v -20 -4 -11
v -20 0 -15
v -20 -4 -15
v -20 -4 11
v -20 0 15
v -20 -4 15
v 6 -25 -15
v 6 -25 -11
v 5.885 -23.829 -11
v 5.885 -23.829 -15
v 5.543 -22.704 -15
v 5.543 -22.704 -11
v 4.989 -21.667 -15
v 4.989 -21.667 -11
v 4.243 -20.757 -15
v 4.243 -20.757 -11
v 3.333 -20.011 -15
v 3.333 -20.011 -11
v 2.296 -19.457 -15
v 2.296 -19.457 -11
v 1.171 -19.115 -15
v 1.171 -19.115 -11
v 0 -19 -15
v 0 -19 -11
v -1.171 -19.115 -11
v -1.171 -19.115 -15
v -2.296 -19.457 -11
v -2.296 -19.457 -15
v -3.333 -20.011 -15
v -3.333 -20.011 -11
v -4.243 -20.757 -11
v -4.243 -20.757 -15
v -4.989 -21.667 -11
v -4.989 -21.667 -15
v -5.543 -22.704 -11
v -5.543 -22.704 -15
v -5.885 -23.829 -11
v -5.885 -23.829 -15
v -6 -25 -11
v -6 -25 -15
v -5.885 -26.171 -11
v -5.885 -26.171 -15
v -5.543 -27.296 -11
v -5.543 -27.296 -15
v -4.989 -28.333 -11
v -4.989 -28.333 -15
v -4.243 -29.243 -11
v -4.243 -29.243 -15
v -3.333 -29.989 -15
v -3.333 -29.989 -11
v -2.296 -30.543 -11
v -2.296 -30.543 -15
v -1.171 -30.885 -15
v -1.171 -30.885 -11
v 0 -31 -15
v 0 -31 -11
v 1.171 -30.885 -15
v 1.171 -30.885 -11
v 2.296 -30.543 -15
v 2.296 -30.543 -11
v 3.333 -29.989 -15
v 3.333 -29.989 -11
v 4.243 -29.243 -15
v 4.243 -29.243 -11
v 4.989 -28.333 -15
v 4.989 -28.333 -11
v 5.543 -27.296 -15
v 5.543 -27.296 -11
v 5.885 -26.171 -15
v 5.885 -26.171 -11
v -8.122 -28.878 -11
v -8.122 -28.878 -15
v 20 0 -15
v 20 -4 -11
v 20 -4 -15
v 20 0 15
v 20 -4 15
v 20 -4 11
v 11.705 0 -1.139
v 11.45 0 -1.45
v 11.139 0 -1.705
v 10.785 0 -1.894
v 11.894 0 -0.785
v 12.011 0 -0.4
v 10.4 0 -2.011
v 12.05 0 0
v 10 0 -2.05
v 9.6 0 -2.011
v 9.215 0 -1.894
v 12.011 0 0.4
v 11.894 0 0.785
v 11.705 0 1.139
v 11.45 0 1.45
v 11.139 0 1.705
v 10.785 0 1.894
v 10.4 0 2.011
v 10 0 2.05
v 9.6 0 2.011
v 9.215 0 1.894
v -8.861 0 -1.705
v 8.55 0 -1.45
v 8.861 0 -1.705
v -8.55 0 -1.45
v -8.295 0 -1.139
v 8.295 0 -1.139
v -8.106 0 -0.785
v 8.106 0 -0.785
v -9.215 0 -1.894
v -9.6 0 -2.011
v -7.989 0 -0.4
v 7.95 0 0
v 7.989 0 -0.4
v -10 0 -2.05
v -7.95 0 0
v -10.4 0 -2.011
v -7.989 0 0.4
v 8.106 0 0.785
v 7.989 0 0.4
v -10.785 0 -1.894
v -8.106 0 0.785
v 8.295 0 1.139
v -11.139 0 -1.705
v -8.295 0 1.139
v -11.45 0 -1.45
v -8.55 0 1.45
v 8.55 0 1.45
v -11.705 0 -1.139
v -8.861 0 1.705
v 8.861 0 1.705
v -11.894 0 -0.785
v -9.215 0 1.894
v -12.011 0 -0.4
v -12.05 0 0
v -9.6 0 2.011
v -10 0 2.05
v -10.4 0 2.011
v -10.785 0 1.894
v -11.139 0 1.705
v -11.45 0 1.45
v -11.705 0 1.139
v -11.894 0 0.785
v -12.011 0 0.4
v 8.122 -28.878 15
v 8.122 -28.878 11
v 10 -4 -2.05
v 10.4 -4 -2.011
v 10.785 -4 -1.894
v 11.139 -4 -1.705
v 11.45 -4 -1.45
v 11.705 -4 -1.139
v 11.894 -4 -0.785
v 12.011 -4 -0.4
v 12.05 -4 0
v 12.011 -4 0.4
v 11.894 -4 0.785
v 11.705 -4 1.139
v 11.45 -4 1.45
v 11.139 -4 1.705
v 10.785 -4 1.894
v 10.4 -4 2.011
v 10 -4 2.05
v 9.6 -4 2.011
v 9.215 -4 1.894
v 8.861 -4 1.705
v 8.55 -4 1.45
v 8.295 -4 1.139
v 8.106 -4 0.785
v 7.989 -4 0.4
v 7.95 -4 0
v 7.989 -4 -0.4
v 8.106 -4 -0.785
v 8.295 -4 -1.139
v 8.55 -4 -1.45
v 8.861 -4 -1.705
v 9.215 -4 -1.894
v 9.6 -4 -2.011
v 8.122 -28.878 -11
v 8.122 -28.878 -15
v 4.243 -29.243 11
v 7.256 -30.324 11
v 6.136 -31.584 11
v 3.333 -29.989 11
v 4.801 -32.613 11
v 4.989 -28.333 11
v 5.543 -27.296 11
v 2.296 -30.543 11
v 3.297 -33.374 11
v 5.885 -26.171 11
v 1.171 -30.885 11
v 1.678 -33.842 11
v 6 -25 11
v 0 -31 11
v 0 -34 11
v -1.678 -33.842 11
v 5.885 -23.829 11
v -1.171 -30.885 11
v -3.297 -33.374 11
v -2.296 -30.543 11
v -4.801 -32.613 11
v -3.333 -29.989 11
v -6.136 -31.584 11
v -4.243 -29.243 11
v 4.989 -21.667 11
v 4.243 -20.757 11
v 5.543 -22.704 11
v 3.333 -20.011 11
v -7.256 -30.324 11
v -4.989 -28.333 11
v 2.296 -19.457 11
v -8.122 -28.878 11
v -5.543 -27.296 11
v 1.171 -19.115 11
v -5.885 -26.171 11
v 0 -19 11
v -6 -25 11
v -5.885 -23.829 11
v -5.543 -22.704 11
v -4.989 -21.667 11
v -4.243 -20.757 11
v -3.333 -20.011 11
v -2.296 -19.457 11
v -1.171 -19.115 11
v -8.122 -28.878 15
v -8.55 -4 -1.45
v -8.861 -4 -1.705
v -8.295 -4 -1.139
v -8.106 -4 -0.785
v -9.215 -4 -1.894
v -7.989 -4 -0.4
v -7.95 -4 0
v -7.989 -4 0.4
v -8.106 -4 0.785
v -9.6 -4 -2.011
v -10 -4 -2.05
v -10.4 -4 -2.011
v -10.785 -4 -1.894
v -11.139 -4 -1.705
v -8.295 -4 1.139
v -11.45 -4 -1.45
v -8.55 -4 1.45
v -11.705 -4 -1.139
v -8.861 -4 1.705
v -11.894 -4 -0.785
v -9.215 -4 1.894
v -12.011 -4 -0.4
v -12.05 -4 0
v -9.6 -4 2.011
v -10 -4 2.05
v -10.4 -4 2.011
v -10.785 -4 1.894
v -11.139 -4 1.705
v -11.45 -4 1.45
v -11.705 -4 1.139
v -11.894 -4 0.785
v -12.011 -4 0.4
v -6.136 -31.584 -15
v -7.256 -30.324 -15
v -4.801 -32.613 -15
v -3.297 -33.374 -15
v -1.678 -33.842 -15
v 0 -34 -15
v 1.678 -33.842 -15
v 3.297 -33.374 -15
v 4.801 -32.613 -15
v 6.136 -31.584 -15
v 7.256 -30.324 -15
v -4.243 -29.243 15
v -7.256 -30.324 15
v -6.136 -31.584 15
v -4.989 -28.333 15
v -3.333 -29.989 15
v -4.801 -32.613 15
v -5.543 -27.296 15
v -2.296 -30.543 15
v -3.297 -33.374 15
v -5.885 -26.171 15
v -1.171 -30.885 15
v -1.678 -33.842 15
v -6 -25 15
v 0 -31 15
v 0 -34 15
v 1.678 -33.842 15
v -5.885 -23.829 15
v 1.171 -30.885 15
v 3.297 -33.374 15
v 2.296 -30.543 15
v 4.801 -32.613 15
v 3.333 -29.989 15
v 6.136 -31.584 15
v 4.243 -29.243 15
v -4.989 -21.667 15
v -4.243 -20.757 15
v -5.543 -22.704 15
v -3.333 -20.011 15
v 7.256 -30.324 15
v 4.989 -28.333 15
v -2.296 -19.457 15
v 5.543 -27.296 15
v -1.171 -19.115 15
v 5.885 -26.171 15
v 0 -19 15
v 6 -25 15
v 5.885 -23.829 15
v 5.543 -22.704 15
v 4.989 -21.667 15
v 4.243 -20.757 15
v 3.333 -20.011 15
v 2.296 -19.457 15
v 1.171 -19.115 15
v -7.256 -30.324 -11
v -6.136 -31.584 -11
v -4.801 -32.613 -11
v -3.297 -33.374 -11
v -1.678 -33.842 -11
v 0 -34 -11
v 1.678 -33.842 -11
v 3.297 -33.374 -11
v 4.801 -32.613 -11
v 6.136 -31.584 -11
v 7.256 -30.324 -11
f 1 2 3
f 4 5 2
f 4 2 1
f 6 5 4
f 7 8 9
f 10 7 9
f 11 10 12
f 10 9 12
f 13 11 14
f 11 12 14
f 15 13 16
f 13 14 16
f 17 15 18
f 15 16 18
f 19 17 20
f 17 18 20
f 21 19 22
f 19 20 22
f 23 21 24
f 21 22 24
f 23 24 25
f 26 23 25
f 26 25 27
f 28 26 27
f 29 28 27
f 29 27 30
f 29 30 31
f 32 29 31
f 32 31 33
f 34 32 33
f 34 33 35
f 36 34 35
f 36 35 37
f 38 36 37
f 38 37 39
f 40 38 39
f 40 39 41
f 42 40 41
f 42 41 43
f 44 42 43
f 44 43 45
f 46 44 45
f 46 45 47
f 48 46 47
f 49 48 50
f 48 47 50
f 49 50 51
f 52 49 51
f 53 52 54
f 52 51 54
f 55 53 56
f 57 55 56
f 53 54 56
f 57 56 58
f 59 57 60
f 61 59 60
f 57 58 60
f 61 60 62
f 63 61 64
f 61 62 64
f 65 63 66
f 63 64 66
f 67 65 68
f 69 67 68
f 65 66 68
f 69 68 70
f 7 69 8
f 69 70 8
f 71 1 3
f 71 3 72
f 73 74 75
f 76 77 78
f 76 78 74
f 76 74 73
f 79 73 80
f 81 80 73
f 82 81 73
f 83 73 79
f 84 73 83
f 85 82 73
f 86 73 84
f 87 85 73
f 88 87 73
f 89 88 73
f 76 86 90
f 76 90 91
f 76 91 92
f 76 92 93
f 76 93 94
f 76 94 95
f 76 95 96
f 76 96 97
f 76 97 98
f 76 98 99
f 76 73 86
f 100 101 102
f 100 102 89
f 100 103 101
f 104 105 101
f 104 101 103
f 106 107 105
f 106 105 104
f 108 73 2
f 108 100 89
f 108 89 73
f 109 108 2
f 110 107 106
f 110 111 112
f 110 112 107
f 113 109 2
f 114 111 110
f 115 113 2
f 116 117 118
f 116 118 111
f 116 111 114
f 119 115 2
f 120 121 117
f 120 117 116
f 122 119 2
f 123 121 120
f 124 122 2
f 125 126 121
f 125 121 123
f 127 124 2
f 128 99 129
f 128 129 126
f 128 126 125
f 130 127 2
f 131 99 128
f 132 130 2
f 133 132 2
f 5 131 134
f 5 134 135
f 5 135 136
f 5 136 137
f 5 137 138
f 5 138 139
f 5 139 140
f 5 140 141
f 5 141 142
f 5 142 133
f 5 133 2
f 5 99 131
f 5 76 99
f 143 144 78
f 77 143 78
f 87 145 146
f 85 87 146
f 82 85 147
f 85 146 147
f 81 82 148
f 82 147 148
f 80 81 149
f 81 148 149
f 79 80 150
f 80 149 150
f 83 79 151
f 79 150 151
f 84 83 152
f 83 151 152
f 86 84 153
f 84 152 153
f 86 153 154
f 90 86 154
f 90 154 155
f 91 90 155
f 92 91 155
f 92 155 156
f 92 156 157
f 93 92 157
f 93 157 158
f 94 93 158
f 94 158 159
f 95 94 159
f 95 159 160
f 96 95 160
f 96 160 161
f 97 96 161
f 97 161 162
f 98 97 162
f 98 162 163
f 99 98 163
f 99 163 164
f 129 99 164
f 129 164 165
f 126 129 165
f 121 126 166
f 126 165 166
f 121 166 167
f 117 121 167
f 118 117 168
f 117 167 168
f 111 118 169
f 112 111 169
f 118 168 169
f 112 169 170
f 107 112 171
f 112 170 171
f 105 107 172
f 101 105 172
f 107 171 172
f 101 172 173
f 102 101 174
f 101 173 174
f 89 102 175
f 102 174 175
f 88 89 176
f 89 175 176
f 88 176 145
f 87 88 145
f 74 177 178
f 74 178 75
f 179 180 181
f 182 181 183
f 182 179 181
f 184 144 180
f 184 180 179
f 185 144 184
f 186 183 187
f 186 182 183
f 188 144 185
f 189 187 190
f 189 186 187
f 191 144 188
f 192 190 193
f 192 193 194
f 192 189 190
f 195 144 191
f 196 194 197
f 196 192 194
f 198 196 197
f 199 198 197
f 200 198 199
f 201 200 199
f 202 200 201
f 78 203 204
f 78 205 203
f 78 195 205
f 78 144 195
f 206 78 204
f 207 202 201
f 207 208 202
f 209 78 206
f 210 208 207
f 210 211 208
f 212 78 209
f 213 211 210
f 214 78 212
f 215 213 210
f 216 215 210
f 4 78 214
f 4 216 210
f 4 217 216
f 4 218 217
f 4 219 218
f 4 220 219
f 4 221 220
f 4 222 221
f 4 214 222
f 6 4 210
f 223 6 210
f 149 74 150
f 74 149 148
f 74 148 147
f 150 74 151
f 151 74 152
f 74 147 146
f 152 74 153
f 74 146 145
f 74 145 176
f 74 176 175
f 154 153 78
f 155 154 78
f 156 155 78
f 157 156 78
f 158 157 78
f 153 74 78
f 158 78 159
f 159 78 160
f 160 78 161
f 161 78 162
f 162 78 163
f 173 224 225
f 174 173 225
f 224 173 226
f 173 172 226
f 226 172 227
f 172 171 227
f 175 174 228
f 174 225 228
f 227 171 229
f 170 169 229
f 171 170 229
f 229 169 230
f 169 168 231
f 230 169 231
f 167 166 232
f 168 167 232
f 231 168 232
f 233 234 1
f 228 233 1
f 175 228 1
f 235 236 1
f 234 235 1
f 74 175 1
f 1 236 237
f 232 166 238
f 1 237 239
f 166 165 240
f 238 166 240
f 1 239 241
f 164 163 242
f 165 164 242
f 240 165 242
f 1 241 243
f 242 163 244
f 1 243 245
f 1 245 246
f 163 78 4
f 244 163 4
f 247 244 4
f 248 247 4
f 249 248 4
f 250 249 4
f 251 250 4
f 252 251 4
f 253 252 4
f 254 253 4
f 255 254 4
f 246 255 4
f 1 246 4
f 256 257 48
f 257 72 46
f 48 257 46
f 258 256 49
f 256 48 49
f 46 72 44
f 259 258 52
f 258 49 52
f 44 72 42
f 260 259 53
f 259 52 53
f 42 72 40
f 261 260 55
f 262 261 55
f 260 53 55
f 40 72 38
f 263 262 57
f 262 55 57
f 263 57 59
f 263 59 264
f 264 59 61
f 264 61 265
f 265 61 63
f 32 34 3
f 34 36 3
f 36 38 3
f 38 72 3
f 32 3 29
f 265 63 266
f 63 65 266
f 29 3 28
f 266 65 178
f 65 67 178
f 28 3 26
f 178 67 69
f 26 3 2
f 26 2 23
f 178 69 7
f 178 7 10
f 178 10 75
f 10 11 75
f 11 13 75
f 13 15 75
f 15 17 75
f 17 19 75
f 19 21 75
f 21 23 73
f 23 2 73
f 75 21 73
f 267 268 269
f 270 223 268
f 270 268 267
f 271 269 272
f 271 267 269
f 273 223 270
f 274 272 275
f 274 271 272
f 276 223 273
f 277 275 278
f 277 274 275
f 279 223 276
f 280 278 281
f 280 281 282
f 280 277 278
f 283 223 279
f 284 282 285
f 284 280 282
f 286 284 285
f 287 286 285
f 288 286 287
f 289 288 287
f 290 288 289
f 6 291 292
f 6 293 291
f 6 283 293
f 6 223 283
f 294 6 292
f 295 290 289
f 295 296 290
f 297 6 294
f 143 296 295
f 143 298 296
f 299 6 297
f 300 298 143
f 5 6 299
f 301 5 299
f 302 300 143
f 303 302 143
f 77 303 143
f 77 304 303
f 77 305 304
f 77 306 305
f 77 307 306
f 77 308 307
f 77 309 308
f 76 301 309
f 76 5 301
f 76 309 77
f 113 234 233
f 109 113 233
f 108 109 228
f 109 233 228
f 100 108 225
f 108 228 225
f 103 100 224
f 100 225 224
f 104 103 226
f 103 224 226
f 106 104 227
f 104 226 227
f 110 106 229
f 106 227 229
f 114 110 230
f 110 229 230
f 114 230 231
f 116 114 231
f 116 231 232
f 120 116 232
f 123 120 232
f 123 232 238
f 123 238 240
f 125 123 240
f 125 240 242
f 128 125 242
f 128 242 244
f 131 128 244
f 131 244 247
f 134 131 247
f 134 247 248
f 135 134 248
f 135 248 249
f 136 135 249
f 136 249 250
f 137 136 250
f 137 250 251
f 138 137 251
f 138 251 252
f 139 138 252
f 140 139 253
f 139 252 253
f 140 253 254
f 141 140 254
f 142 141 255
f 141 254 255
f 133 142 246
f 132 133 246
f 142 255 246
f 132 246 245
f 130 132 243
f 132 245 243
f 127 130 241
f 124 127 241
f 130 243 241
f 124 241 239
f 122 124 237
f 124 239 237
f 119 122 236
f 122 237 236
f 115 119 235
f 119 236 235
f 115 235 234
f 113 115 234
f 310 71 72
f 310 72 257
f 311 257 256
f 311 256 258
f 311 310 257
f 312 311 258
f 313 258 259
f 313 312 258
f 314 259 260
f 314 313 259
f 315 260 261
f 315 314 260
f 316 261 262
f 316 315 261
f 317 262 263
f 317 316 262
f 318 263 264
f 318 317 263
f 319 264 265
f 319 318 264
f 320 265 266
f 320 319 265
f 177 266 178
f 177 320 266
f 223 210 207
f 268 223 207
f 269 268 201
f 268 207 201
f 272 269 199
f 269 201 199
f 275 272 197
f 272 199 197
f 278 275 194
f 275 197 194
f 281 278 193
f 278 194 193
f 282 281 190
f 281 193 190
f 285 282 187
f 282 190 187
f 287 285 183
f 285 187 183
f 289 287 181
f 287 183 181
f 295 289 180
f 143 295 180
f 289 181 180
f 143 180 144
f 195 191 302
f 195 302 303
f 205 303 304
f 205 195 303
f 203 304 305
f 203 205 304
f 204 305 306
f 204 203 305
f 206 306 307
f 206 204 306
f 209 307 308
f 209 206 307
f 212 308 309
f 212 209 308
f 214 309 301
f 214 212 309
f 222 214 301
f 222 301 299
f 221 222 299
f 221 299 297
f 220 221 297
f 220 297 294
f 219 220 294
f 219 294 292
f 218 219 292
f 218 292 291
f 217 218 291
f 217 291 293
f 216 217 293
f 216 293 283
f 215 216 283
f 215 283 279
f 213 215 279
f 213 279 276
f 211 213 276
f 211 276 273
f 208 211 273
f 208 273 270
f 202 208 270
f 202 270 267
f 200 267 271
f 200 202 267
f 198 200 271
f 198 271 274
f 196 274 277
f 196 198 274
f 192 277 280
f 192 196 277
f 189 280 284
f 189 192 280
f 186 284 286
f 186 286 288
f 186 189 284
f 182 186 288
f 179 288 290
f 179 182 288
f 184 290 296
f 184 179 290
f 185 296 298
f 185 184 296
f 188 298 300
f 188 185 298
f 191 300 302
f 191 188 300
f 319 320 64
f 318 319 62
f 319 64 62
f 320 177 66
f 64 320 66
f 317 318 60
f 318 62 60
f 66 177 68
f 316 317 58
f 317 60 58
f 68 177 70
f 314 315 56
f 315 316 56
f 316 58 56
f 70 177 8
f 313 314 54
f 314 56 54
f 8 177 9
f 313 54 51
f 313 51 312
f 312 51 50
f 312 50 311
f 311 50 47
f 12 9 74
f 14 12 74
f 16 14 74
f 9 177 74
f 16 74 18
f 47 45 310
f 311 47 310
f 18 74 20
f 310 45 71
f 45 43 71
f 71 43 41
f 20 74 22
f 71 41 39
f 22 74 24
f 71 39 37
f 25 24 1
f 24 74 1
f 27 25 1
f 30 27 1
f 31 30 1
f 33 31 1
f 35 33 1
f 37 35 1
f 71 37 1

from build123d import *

# Parameters (mm, degrees)
SKETCH_1_W          = 40
SKETCH_1_H          = 20
EXTRUDE_1_DEPTH     = 4
SKETCH_2_R          = 6
EXTRUDE_2_DEPTH     = 5
SKETCH_3_W          = 40
SKETCH_3_H          = 35
CUT_EXTRUDE_1_DEPTH = 1
SKETCH_6_R          = 2.05
CUT_EXTRUDE_3_DEPTH = 10


with BuildPart() as part:
    # 草图1 → 凸台-拉伸1 (new body)
    with BuildSketch(Plane(origin=(0, 0, 0), x_dir=(1, 0, 0), z_dir=(0, 1, 0))):
        Rectangle(SKETCH_1_W, SKETCH_1_H)
    extrude(amount=-EXTRUDE_1_DEPTH)

    # 草图2 → 凸台-拉伸2 (add)
    with BuildSketch(Plane.XY.offset(10)):
        with BuildLine():
            Line((20, -4), (20, 0))
            Line((20, 0), (-20, 0))
            Line((-20, 0), (-20, -4))
            Line((-20, -4), (-8.121724647, -28.877832997))
            ThreePointArc((-8.121724647, -28.877832997), (0, -34), (8.121724647, -28.877832997))
            Line((8.121724647, -28.877832997), (20, -4))
        make_face()
        with Locations((0, -25)):
            Circle(SKETCH_2_R, mode=Mode.SUBTRACT)
    extrude_2 = extrude(amount=EXTRUDE_2_DEPTH)

    # 草图3 → 切除-拉伸1 (cut)
    with BuildSketch(Plane(origin=(0, 0, 10), x_dir=(-1, 0, 0), z_dir=(0, 0, -1))):
        with Locations((0, -21.5)):
            Rectangle(SKETCH_3_W, SKETCH_3_H)
    cut_extrude_1 = extrude(amount=-CUT_EXTRUDE_1_DEPTH, mode=Mode.SUBTRACT)

    # 镜向1: 凸台-拉伸2, 切除-拉伸1 across plane
    add(extrude_2.mirror(Plane.XY))
    add(cut_extrude_1.mirror(Plane.XY), mode=Mode.SUBTRACT)

    # 草图6 → 切除-拉伸3 (cut)
    with BuildSketch(Plane.XZ.offset(4)):
        with Locations(Location((-10, 0, 0), (0, 0, 270))):
            Circle(SKETCH_6_R)
        with Locations(Location((10, 0, 0), (0, 0, 270))):
            Circle(SKETCH_6_R)
    extrude(amount=-CUT_EXTRUDE_3_DEPTH, mode=Mode.SUBTRACT)


solid = part.part
